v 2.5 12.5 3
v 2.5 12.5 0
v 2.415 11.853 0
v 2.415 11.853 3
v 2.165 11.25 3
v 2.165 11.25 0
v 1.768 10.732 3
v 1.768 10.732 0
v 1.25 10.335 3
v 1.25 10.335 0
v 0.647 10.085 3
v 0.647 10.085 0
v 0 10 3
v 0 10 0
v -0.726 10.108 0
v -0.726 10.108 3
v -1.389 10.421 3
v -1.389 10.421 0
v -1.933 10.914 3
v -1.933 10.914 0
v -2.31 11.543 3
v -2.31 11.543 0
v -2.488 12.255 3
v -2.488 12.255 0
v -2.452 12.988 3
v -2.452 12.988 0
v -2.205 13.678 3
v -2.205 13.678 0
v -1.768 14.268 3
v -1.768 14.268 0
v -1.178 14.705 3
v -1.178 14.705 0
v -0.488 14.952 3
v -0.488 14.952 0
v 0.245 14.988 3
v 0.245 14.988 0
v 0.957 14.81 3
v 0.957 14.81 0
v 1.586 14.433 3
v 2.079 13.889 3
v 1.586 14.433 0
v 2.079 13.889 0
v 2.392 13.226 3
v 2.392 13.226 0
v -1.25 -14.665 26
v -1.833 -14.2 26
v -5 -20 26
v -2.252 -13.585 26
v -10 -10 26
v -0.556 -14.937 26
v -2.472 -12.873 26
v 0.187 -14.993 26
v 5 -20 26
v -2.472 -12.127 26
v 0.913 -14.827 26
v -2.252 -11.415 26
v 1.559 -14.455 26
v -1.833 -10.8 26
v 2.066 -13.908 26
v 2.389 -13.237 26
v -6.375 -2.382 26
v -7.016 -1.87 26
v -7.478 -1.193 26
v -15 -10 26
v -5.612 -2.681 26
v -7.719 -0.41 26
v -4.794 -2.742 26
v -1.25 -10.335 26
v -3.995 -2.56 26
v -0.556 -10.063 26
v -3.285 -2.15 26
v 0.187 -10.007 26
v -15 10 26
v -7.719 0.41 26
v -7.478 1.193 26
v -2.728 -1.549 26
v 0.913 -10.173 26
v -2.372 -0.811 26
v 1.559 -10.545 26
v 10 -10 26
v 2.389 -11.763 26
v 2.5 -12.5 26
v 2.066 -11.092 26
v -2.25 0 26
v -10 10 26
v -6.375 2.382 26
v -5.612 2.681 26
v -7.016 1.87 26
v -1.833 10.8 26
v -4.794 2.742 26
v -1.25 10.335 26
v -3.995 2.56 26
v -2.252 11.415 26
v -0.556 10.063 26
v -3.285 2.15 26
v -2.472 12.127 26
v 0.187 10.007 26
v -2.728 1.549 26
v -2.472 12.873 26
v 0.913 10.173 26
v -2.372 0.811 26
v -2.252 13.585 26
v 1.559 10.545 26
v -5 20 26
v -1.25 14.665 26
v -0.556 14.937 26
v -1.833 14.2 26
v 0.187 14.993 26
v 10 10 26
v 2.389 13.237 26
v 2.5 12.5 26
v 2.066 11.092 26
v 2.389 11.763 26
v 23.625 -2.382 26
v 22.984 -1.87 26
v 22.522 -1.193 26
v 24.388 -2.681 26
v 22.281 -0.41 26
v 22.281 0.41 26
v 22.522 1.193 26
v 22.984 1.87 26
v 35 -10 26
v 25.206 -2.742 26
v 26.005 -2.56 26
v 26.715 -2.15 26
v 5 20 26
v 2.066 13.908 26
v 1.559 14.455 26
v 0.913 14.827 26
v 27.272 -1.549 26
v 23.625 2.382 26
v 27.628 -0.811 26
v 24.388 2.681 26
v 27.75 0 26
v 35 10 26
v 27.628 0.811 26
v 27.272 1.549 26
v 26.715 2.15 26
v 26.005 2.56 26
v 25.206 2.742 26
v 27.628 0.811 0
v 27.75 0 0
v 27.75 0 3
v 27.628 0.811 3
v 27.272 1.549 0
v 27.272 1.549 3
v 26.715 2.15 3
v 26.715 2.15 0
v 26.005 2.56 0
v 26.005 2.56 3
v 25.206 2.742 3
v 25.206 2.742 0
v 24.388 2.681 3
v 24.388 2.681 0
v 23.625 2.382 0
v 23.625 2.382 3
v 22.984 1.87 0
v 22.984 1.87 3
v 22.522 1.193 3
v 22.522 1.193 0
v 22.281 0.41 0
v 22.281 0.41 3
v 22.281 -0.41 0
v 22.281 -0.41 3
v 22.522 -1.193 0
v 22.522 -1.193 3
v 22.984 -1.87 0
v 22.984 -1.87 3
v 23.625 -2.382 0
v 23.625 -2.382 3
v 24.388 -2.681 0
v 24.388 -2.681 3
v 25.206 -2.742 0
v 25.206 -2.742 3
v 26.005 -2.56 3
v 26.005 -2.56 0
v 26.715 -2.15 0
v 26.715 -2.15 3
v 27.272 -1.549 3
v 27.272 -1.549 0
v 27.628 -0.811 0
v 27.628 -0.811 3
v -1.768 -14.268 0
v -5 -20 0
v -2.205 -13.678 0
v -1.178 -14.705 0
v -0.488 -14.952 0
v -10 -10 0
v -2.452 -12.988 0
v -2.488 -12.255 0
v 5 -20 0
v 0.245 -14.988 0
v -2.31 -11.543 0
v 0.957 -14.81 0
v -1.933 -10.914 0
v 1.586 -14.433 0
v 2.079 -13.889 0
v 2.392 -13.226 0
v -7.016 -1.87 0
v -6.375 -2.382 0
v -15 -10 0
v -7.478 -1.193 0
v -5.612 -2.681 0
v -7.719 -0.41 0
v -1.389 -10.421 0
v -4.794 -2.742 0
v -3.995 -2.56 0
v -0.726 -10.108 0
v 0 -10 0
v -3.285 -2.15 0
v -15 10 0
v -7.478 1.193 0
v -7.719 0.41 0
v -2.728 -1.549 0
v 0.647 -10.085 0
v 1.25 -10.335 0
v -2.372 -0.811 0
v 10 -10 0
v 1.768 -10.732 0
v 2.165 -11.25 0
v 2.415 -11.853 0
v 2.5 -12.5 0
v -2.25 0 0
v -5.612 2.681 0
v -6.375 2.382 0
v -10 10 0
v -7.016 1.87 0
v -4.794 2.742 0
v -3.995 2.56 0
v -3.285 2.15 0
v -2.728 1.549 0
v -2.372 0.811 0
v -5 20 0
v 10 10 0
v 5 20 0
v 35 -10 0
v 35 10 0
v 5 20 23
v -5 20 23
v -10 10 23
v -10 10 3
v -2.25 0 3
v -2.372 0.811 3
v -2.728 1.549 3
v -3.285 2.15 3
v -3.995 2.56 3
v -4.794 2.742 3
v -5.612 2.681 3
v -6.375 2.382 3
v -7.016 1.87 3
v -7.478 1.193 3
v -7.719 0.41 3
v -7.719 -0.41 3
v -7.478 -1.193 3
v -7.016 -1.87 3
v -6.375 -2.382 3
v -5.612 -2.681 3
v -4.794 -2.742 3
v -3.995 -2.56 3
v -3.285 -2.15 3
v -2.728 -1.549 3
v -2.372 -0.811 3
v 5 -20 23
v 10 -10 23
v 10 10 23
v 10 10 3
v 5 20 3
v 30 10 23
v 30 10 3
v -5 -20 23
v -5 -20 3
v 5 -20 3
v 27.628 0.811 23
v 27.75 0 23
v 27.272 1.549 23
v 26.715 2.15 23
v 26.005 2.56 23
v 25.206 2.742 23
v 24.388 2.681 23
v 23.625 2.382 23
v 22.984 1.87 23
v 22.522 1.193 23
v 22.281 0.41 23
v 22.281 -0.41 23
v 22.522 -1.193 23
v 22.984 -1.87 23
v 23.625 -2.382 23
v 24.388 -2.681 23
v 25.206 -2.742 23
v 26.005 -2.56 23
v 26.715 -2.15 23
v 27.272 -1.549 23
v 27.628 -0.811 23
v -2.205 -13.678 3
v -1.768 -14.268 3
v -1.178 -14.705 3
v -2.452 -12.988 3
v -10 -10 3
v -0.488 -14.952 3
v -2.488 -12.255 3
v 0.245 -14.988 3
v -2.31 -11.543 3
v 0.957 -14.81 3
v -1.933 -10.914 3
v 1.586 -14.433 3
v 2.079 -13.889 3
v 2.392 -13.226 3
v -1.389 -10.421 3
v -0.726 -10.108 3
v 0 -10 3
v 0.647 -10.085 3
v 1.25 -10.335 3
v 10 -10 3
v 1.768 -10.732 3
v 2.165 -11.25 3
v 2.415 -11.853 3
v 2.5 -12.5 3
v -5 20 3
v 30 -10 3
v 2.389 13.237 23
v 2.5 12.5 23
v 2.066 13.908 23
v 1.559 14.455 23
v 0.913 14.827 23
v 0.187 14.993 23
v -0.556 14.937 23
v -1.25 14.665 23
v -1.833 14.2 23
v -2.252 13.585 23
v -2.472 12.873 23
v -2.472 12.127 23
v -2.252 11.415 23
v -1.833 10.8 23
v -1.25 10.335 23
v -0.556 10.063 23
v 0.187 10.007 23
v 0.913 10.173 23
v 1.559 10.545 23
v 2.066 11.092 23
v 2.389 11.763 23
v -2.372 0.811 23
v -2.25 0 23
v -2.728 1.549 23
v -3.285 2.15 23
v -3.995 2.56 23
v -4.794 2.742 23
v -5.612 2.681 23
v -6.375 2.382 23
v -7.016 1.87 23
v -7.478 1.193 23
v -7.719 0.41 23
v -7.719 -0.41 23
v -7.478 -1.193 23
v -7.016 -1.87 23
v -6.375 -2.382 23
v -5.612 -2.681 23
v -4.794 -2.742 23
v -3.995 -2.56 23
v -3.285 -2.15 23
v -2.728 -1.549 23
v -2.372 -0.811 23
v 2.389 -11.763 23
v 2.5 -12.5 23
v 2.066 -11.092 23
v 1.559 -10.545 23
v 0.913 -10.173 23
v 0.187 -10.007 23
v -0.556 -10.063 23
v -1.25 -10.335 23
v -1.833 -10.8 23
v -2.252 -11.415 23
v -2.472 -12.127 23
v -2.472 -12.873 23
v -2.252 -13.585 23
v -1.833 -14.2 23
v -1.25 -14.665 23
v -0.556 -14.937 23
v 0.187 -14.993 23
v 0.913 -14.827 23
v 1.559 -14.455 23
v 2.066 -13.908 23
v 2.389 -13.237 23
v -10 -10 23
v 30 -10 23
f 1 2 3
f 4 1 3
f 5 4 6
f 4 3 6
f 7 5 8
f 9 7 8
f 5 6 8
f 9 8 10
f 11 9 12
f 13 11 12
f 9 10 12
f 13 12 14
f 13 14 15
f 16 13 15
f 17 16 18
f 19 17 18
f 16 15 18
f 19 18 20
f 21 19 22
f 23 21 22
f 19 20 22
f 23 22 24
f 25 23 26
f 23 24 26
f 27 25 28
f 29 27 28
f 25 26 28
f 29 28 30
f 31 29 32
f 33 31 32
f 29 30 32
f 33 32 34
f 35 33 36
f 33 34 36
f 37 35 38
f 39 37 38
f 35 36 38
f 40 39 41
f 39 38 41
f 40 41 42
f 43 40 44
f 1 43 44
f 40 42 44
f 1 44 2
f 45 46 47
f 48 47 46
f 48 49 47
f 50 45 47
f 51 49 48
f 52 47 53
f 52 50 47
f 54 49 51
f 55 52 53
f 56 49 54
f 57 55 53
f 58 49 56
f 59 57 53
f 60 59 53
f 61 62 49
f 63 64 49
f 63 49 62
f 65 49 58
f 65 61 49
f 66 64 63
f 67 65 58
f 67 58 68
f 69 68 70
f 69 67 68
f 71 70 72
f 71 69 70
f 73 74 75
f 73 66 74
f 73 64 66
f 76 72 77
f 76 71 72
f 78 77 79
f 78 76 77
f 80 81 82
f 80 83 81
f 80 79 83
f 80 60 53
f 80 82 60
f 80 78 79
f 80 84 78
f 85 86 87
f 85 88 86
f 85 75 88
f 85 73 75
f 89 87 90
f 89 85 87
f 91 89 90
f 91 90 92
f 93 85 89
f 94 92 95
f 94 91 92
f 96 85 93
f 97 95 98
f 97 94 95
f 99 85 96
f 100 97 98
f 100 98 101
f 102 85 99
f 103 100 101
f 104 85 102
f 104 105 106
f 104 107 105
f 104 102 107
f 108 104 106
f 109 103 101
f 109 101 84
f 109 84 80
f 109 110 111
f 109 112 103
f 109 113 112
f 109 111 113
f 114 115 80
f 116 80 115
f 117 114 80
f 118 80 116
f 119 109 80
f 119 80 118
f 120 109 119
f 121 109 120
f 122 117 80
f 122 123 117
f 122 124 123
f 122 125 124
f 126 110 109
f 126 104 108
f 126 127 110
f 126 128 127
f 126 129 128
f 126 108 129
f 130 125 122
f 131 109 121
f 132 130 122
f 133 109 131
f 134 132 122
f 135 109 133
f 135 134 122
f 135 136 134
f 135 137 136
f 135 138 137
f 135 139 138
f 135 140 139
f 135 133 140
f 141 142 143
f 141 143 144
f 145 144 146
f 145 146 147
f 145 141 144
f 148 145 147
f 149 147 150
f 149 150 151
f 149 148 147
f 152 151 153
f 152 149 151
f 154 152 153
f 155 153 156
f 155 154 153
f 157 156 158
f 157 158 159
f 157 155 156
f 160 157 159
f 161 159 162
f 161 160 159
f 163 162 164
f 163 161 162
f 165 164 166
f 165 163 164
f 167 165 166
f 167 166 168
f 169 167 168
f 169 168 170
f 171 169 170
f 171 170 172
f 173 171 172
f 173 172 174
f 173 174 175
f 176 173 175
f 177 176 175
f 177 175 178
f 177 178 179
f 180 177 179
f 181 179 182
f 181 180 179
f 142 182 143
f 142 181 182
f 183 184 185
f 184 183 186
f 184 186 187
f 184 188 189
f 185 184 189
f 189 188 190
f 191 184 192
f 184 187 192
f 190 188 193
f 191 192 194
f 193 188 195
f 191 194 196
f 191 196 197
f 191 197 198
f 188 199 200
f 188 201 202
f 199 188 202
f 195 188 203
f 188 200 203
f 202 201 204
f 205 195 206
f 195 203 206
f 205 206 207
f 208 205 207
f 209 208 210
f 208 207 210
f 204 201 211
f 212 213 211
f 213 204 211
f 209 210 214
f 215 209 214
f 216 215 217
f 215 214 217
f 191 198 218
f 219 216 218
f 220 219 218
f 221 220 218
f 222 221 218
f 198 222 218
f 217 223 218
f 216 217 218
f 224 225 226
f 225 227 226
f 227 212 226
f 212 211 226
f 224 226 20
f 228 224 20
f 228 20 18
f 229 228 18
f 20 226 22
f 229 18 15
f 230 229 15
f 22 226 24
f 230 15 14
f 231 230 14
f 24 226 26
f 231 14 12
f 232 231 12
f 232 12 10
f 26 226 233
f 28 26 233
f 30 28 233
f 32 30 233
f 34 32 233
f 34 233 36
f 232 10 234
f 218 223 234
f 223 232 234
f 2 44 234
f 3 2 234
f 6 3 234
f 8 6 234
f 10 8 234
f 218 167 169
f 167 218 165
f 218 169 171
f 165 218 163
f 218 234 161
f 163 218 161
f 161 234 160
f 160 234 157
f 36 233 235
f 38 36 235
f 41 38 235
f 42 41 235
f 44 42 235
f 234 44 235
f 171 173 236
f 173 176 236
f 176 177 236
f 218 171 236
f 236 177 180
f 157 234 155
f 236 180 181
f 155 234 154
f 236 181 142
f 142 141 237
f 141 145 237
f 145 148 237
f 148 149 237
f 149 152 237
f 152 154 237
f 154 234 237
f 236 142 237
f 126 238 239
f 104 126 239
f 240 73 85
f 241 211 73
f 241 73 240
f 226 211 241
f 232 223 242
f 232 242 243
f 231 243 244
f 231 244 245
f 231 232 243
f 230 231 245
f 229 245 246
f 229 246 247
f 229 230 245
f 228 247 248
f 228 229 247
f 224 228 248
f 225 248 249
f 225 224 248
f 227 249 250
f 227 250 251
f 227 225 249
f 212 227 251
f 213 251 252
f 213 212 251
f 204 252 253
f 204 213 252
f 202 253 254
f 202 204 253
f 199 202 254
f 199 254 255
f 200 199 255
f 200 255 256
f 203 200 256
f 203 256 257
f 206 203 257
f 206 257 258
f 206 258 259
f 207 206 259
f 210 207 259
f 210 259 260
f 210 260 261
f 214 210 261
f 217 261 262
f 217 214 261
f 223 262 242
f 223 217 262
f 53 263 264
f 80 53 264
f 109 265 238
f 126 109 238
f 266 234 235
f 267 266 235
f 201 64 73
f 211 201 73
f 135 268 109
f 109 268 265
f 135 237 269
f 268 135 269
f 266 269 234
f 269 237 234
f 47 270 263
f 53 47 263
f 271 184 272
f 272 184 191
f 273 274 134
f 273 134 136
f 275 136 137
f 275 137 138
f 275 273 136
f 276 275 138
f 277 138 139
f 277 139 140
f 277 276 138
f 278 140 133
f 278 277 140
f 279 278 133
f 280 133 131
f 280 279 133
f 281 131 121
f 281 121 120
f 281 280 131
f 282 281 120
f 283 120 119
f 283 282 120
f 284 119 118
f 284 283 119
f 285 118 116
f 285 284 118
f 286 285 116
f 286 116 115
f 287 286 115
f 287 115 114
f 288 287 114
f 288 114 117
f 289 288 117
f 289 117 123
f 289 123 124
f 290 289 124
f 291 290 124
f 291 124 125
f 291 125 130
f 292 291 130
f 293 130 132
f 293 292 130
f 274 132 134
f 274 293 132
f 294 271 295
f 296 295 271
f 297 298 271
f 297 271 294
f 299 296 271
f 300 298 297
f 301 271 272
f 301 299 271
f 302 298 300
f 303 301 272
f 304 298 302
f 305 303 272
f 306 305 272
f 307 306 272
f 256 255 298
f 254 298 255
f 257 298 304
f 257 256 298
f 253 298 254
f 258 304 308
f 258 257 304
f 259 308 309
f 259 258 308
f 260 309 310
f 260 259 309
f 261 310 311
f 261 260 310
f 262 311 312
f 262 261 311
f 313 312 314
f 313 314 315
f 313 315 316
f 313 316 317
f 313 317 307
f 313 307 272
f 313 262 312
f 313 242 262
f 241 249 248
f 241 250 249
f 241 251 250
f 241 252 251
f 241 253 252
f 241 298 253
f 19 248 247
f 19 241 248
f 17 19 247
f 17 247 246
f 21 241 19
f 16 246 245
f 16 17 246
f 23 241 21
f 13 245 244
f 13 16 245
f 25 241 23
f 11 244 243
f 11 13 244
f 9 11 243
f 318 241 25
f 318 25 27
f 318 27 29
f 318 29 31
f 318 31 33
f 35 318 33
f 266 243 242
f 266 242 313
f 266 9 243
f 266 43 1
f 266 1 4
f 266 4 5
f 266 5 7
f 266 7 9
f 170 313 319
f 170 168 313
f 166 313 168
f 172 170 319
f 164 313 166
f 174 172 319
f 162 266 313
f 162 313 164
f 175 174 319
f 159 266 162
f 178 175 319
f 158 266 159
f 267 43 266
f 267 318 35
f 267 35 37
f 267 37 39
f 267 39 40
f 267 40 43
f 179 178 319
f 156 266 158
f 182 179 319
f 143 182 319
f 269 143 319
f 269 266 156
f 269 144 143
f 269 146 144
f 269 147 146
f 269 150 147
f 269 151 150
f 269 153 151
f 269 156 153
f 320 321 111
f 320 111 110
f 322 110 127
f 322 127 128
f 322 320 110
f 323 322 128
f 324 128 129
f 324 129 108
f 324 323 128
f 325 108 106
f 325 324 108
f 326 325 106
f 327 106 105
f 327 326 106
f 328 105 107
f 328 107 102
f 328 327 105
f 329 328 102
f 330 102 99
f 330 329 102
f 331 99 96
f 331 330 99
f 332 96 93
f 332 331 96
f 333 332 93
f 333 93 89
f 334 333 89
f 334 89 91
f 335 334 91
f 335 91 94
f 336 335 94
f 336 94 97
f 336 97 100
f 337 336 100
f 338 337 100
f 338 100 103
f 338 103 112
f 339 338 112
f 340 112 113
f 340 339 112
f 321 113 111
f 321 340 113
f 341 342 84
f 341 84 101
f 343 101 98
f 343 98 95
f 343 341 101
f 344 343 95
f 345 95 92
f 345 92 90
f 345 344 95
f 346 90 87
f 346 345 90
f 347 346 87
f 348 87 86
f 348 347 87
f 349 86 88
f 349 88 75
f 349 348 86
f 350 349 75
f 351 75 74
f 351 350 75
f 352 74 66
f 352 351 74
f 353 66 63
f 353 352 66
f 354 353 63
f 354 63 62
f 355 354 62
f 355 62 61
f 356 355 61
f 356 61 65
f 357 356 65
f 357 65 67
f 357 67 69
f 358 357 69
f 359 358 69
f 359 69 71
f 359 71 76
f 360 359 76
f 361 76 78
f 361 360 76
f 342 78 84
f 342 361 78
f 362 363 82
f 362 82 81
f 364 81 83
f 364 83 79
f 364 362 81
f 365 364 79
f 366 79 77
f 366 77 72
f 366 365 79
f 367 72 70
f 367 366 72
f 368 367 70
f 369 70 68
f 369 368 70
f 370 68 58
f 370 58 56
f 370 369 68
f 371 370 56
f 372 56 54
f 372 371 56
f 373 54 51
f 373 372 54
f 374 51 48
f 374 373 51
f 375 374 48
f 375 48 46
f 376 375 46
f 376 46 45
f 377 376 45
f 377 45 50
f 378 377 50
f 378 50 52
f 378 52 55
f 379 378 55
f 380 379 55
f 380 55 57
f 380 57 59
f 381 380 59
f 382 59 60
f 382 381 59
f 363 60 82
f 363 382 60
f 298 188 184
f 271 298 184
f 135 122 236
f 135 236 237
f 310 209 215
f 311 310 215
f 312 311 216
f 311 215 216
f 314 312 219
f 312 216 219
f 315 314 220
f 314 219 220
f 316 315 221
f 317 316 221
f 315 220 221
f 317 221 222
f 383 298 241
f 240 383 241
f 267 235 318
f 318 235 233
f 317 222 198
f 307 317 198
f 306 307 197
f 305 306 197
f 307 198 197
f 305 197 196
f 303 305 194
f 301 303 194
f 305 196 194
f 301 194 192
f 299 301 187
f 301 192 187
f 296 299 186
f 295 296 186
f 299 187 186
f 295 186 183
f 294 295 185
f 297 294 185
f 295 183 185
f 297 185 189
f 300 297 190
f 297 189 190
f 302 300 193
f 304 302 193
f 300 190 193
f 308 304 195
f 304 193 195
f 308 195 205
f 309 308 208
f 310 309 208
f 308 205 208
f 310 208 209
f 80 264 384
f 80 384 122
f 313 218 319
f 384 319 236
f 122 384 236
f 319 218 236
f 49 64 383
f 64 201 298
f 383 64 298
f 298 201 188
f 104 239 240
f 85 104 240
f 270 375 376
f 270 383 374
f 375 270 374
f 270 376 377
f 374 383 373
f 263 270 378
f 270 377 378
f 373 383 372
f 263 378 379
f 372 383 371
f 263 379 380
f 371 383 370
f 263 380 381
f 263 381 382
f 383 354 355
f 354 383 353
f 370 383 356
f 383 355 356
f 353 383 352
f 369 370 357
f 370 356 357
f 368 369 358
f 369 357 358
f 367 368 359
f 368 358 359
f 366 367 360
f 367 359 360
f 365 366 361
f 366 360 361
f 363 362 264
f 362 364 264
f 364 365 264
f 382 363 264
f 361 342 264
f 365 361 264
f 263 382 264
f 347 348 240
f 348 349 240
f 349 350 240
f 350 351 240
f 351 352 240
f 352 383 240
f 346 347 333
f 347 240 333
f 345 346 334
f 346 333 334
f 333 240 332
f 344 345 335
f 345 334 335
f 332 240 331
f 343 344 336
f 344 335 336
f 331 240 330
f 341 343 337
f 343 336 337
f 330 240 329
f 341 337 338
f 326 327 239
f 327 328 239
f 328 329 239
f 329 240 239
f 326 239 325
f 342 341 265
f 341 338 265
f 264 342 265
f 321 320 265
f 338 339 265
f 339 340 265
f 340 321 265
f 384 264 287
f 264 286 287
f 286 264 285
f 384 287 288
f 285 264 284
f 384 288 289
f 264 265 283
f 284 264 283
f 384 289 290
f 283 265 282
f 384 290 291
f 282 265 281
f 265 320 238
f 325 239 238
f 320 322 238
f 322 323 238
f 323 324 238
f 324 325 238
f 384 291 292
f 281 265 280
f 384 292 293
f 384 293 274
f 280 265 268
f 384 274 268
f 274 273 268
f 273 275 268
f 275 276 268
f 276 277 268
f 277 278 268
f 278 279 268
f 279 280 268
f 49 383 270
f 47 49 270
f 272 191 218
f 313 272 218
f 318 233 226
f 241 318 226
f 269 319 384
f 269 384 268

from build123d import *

# Parameters (mm, degrees)
F0_R        = 2.75
F0_W        = 20
F0_H        = 20
F1_DEPTH    = 3
F0_W_2      = 5
F2_DEPTH    = 26
F3_START    = 20
F1_FACE_R   = 2.75
F1_FACE_R_2 = 2.5
F3_DEPTH    = 3


with BuildPart() as f1:
    # F0 (on Top) → F1 (new body)
    with BuildSketch(Plane.XY):
        Polygon((0, 10), (-10, 10), (-10, -10), (0, -10), (10, -10), (10, 10), align=None)
        with Locations((-5, 0)):
            Circle(F0_R, mode=Mode.SUBTRACT)
        Polygon((0, -10), (-10, -10), (-5, -20), (5, -20), (10, -10), align=None)
        with BuildLine():
            ThreePointArc((2.5, -12.5), (-1.767766953, -14.267766953), (0, -10))
            ThreePointArc((0, -10), (1.767766953, -10.732233047), (2.5, -12.5))
        make_face(mode=Mode.SUBTRACT)
        Polygon((-5, 20), (-10, 10), (0, 10), (10, 10), (5, 20), align=None)
        with BuildLine():
            ThreePointArc((2.5, 12.5), (1.767766953, 10.732233047), (0, 10))
            ThreePointArc((0, 10), (-1.767766953, 14.267766953), (2.5, 12.5))
        make_face(mode=Mode.SUBTRACT)
        with Locations((20, 0)):
            Rectangle(F0_W, F0_H)
        with Locations((25, 0)):
            Circle(F0_R, mode=Mode.SUBTRACT)
    extrude(amount=F1_DEPTH)

    # F0 (on Top) → F2 (join)
    with BuildSketch(Plane.XY):
        with Locations((-12.5, 0)):
            Rectangle(F0_W_2, F0_H)
        with Locations((32.5, 0)):
            Rectangle(F0_W_2, F0_H)
    extrude(amount=F2_DEPTH)

    # F1_face (on face) → F3 (join)
    with BuildSketch(Plane(origin=(7.4267013707, 0, 3), x_dir=(1, 0, 0), z_dir=(0, 0, 1)).offset(F3_START)):
        Polygon((-17.4267013707, 10), (-17.4267013707, -10), (-12.4267013707, -20), (-2.4267013707, -20), (2.5732986293, -10), (22.5732986293, -10), (22.5732986293, 10), (2.5732986293, 10), (-2.4267013707, 20), (-12.4267013707, 20), align=None)
        with Locations((-12.4267013707, 0)):
            Circle(F1_FACE_R, mode=Mode.SUBTRACT)
        with Locations((-7.4267013707, -12.5)):
            Circle(F1_FACE_R_2, mode=Mode.SUBTRACT)
        with Locations((-7.4267013707, 12.5)):
            Circle(F1_FACE_R_2, mode=Mode.SUBTRACT)
        with Locations((17.5732986293, 0)):
            Circle(F1_FACE_R, mode=Mode.SUBTRACT)
    extrude(amount=F3_DEPTH)


solid = f1.part
